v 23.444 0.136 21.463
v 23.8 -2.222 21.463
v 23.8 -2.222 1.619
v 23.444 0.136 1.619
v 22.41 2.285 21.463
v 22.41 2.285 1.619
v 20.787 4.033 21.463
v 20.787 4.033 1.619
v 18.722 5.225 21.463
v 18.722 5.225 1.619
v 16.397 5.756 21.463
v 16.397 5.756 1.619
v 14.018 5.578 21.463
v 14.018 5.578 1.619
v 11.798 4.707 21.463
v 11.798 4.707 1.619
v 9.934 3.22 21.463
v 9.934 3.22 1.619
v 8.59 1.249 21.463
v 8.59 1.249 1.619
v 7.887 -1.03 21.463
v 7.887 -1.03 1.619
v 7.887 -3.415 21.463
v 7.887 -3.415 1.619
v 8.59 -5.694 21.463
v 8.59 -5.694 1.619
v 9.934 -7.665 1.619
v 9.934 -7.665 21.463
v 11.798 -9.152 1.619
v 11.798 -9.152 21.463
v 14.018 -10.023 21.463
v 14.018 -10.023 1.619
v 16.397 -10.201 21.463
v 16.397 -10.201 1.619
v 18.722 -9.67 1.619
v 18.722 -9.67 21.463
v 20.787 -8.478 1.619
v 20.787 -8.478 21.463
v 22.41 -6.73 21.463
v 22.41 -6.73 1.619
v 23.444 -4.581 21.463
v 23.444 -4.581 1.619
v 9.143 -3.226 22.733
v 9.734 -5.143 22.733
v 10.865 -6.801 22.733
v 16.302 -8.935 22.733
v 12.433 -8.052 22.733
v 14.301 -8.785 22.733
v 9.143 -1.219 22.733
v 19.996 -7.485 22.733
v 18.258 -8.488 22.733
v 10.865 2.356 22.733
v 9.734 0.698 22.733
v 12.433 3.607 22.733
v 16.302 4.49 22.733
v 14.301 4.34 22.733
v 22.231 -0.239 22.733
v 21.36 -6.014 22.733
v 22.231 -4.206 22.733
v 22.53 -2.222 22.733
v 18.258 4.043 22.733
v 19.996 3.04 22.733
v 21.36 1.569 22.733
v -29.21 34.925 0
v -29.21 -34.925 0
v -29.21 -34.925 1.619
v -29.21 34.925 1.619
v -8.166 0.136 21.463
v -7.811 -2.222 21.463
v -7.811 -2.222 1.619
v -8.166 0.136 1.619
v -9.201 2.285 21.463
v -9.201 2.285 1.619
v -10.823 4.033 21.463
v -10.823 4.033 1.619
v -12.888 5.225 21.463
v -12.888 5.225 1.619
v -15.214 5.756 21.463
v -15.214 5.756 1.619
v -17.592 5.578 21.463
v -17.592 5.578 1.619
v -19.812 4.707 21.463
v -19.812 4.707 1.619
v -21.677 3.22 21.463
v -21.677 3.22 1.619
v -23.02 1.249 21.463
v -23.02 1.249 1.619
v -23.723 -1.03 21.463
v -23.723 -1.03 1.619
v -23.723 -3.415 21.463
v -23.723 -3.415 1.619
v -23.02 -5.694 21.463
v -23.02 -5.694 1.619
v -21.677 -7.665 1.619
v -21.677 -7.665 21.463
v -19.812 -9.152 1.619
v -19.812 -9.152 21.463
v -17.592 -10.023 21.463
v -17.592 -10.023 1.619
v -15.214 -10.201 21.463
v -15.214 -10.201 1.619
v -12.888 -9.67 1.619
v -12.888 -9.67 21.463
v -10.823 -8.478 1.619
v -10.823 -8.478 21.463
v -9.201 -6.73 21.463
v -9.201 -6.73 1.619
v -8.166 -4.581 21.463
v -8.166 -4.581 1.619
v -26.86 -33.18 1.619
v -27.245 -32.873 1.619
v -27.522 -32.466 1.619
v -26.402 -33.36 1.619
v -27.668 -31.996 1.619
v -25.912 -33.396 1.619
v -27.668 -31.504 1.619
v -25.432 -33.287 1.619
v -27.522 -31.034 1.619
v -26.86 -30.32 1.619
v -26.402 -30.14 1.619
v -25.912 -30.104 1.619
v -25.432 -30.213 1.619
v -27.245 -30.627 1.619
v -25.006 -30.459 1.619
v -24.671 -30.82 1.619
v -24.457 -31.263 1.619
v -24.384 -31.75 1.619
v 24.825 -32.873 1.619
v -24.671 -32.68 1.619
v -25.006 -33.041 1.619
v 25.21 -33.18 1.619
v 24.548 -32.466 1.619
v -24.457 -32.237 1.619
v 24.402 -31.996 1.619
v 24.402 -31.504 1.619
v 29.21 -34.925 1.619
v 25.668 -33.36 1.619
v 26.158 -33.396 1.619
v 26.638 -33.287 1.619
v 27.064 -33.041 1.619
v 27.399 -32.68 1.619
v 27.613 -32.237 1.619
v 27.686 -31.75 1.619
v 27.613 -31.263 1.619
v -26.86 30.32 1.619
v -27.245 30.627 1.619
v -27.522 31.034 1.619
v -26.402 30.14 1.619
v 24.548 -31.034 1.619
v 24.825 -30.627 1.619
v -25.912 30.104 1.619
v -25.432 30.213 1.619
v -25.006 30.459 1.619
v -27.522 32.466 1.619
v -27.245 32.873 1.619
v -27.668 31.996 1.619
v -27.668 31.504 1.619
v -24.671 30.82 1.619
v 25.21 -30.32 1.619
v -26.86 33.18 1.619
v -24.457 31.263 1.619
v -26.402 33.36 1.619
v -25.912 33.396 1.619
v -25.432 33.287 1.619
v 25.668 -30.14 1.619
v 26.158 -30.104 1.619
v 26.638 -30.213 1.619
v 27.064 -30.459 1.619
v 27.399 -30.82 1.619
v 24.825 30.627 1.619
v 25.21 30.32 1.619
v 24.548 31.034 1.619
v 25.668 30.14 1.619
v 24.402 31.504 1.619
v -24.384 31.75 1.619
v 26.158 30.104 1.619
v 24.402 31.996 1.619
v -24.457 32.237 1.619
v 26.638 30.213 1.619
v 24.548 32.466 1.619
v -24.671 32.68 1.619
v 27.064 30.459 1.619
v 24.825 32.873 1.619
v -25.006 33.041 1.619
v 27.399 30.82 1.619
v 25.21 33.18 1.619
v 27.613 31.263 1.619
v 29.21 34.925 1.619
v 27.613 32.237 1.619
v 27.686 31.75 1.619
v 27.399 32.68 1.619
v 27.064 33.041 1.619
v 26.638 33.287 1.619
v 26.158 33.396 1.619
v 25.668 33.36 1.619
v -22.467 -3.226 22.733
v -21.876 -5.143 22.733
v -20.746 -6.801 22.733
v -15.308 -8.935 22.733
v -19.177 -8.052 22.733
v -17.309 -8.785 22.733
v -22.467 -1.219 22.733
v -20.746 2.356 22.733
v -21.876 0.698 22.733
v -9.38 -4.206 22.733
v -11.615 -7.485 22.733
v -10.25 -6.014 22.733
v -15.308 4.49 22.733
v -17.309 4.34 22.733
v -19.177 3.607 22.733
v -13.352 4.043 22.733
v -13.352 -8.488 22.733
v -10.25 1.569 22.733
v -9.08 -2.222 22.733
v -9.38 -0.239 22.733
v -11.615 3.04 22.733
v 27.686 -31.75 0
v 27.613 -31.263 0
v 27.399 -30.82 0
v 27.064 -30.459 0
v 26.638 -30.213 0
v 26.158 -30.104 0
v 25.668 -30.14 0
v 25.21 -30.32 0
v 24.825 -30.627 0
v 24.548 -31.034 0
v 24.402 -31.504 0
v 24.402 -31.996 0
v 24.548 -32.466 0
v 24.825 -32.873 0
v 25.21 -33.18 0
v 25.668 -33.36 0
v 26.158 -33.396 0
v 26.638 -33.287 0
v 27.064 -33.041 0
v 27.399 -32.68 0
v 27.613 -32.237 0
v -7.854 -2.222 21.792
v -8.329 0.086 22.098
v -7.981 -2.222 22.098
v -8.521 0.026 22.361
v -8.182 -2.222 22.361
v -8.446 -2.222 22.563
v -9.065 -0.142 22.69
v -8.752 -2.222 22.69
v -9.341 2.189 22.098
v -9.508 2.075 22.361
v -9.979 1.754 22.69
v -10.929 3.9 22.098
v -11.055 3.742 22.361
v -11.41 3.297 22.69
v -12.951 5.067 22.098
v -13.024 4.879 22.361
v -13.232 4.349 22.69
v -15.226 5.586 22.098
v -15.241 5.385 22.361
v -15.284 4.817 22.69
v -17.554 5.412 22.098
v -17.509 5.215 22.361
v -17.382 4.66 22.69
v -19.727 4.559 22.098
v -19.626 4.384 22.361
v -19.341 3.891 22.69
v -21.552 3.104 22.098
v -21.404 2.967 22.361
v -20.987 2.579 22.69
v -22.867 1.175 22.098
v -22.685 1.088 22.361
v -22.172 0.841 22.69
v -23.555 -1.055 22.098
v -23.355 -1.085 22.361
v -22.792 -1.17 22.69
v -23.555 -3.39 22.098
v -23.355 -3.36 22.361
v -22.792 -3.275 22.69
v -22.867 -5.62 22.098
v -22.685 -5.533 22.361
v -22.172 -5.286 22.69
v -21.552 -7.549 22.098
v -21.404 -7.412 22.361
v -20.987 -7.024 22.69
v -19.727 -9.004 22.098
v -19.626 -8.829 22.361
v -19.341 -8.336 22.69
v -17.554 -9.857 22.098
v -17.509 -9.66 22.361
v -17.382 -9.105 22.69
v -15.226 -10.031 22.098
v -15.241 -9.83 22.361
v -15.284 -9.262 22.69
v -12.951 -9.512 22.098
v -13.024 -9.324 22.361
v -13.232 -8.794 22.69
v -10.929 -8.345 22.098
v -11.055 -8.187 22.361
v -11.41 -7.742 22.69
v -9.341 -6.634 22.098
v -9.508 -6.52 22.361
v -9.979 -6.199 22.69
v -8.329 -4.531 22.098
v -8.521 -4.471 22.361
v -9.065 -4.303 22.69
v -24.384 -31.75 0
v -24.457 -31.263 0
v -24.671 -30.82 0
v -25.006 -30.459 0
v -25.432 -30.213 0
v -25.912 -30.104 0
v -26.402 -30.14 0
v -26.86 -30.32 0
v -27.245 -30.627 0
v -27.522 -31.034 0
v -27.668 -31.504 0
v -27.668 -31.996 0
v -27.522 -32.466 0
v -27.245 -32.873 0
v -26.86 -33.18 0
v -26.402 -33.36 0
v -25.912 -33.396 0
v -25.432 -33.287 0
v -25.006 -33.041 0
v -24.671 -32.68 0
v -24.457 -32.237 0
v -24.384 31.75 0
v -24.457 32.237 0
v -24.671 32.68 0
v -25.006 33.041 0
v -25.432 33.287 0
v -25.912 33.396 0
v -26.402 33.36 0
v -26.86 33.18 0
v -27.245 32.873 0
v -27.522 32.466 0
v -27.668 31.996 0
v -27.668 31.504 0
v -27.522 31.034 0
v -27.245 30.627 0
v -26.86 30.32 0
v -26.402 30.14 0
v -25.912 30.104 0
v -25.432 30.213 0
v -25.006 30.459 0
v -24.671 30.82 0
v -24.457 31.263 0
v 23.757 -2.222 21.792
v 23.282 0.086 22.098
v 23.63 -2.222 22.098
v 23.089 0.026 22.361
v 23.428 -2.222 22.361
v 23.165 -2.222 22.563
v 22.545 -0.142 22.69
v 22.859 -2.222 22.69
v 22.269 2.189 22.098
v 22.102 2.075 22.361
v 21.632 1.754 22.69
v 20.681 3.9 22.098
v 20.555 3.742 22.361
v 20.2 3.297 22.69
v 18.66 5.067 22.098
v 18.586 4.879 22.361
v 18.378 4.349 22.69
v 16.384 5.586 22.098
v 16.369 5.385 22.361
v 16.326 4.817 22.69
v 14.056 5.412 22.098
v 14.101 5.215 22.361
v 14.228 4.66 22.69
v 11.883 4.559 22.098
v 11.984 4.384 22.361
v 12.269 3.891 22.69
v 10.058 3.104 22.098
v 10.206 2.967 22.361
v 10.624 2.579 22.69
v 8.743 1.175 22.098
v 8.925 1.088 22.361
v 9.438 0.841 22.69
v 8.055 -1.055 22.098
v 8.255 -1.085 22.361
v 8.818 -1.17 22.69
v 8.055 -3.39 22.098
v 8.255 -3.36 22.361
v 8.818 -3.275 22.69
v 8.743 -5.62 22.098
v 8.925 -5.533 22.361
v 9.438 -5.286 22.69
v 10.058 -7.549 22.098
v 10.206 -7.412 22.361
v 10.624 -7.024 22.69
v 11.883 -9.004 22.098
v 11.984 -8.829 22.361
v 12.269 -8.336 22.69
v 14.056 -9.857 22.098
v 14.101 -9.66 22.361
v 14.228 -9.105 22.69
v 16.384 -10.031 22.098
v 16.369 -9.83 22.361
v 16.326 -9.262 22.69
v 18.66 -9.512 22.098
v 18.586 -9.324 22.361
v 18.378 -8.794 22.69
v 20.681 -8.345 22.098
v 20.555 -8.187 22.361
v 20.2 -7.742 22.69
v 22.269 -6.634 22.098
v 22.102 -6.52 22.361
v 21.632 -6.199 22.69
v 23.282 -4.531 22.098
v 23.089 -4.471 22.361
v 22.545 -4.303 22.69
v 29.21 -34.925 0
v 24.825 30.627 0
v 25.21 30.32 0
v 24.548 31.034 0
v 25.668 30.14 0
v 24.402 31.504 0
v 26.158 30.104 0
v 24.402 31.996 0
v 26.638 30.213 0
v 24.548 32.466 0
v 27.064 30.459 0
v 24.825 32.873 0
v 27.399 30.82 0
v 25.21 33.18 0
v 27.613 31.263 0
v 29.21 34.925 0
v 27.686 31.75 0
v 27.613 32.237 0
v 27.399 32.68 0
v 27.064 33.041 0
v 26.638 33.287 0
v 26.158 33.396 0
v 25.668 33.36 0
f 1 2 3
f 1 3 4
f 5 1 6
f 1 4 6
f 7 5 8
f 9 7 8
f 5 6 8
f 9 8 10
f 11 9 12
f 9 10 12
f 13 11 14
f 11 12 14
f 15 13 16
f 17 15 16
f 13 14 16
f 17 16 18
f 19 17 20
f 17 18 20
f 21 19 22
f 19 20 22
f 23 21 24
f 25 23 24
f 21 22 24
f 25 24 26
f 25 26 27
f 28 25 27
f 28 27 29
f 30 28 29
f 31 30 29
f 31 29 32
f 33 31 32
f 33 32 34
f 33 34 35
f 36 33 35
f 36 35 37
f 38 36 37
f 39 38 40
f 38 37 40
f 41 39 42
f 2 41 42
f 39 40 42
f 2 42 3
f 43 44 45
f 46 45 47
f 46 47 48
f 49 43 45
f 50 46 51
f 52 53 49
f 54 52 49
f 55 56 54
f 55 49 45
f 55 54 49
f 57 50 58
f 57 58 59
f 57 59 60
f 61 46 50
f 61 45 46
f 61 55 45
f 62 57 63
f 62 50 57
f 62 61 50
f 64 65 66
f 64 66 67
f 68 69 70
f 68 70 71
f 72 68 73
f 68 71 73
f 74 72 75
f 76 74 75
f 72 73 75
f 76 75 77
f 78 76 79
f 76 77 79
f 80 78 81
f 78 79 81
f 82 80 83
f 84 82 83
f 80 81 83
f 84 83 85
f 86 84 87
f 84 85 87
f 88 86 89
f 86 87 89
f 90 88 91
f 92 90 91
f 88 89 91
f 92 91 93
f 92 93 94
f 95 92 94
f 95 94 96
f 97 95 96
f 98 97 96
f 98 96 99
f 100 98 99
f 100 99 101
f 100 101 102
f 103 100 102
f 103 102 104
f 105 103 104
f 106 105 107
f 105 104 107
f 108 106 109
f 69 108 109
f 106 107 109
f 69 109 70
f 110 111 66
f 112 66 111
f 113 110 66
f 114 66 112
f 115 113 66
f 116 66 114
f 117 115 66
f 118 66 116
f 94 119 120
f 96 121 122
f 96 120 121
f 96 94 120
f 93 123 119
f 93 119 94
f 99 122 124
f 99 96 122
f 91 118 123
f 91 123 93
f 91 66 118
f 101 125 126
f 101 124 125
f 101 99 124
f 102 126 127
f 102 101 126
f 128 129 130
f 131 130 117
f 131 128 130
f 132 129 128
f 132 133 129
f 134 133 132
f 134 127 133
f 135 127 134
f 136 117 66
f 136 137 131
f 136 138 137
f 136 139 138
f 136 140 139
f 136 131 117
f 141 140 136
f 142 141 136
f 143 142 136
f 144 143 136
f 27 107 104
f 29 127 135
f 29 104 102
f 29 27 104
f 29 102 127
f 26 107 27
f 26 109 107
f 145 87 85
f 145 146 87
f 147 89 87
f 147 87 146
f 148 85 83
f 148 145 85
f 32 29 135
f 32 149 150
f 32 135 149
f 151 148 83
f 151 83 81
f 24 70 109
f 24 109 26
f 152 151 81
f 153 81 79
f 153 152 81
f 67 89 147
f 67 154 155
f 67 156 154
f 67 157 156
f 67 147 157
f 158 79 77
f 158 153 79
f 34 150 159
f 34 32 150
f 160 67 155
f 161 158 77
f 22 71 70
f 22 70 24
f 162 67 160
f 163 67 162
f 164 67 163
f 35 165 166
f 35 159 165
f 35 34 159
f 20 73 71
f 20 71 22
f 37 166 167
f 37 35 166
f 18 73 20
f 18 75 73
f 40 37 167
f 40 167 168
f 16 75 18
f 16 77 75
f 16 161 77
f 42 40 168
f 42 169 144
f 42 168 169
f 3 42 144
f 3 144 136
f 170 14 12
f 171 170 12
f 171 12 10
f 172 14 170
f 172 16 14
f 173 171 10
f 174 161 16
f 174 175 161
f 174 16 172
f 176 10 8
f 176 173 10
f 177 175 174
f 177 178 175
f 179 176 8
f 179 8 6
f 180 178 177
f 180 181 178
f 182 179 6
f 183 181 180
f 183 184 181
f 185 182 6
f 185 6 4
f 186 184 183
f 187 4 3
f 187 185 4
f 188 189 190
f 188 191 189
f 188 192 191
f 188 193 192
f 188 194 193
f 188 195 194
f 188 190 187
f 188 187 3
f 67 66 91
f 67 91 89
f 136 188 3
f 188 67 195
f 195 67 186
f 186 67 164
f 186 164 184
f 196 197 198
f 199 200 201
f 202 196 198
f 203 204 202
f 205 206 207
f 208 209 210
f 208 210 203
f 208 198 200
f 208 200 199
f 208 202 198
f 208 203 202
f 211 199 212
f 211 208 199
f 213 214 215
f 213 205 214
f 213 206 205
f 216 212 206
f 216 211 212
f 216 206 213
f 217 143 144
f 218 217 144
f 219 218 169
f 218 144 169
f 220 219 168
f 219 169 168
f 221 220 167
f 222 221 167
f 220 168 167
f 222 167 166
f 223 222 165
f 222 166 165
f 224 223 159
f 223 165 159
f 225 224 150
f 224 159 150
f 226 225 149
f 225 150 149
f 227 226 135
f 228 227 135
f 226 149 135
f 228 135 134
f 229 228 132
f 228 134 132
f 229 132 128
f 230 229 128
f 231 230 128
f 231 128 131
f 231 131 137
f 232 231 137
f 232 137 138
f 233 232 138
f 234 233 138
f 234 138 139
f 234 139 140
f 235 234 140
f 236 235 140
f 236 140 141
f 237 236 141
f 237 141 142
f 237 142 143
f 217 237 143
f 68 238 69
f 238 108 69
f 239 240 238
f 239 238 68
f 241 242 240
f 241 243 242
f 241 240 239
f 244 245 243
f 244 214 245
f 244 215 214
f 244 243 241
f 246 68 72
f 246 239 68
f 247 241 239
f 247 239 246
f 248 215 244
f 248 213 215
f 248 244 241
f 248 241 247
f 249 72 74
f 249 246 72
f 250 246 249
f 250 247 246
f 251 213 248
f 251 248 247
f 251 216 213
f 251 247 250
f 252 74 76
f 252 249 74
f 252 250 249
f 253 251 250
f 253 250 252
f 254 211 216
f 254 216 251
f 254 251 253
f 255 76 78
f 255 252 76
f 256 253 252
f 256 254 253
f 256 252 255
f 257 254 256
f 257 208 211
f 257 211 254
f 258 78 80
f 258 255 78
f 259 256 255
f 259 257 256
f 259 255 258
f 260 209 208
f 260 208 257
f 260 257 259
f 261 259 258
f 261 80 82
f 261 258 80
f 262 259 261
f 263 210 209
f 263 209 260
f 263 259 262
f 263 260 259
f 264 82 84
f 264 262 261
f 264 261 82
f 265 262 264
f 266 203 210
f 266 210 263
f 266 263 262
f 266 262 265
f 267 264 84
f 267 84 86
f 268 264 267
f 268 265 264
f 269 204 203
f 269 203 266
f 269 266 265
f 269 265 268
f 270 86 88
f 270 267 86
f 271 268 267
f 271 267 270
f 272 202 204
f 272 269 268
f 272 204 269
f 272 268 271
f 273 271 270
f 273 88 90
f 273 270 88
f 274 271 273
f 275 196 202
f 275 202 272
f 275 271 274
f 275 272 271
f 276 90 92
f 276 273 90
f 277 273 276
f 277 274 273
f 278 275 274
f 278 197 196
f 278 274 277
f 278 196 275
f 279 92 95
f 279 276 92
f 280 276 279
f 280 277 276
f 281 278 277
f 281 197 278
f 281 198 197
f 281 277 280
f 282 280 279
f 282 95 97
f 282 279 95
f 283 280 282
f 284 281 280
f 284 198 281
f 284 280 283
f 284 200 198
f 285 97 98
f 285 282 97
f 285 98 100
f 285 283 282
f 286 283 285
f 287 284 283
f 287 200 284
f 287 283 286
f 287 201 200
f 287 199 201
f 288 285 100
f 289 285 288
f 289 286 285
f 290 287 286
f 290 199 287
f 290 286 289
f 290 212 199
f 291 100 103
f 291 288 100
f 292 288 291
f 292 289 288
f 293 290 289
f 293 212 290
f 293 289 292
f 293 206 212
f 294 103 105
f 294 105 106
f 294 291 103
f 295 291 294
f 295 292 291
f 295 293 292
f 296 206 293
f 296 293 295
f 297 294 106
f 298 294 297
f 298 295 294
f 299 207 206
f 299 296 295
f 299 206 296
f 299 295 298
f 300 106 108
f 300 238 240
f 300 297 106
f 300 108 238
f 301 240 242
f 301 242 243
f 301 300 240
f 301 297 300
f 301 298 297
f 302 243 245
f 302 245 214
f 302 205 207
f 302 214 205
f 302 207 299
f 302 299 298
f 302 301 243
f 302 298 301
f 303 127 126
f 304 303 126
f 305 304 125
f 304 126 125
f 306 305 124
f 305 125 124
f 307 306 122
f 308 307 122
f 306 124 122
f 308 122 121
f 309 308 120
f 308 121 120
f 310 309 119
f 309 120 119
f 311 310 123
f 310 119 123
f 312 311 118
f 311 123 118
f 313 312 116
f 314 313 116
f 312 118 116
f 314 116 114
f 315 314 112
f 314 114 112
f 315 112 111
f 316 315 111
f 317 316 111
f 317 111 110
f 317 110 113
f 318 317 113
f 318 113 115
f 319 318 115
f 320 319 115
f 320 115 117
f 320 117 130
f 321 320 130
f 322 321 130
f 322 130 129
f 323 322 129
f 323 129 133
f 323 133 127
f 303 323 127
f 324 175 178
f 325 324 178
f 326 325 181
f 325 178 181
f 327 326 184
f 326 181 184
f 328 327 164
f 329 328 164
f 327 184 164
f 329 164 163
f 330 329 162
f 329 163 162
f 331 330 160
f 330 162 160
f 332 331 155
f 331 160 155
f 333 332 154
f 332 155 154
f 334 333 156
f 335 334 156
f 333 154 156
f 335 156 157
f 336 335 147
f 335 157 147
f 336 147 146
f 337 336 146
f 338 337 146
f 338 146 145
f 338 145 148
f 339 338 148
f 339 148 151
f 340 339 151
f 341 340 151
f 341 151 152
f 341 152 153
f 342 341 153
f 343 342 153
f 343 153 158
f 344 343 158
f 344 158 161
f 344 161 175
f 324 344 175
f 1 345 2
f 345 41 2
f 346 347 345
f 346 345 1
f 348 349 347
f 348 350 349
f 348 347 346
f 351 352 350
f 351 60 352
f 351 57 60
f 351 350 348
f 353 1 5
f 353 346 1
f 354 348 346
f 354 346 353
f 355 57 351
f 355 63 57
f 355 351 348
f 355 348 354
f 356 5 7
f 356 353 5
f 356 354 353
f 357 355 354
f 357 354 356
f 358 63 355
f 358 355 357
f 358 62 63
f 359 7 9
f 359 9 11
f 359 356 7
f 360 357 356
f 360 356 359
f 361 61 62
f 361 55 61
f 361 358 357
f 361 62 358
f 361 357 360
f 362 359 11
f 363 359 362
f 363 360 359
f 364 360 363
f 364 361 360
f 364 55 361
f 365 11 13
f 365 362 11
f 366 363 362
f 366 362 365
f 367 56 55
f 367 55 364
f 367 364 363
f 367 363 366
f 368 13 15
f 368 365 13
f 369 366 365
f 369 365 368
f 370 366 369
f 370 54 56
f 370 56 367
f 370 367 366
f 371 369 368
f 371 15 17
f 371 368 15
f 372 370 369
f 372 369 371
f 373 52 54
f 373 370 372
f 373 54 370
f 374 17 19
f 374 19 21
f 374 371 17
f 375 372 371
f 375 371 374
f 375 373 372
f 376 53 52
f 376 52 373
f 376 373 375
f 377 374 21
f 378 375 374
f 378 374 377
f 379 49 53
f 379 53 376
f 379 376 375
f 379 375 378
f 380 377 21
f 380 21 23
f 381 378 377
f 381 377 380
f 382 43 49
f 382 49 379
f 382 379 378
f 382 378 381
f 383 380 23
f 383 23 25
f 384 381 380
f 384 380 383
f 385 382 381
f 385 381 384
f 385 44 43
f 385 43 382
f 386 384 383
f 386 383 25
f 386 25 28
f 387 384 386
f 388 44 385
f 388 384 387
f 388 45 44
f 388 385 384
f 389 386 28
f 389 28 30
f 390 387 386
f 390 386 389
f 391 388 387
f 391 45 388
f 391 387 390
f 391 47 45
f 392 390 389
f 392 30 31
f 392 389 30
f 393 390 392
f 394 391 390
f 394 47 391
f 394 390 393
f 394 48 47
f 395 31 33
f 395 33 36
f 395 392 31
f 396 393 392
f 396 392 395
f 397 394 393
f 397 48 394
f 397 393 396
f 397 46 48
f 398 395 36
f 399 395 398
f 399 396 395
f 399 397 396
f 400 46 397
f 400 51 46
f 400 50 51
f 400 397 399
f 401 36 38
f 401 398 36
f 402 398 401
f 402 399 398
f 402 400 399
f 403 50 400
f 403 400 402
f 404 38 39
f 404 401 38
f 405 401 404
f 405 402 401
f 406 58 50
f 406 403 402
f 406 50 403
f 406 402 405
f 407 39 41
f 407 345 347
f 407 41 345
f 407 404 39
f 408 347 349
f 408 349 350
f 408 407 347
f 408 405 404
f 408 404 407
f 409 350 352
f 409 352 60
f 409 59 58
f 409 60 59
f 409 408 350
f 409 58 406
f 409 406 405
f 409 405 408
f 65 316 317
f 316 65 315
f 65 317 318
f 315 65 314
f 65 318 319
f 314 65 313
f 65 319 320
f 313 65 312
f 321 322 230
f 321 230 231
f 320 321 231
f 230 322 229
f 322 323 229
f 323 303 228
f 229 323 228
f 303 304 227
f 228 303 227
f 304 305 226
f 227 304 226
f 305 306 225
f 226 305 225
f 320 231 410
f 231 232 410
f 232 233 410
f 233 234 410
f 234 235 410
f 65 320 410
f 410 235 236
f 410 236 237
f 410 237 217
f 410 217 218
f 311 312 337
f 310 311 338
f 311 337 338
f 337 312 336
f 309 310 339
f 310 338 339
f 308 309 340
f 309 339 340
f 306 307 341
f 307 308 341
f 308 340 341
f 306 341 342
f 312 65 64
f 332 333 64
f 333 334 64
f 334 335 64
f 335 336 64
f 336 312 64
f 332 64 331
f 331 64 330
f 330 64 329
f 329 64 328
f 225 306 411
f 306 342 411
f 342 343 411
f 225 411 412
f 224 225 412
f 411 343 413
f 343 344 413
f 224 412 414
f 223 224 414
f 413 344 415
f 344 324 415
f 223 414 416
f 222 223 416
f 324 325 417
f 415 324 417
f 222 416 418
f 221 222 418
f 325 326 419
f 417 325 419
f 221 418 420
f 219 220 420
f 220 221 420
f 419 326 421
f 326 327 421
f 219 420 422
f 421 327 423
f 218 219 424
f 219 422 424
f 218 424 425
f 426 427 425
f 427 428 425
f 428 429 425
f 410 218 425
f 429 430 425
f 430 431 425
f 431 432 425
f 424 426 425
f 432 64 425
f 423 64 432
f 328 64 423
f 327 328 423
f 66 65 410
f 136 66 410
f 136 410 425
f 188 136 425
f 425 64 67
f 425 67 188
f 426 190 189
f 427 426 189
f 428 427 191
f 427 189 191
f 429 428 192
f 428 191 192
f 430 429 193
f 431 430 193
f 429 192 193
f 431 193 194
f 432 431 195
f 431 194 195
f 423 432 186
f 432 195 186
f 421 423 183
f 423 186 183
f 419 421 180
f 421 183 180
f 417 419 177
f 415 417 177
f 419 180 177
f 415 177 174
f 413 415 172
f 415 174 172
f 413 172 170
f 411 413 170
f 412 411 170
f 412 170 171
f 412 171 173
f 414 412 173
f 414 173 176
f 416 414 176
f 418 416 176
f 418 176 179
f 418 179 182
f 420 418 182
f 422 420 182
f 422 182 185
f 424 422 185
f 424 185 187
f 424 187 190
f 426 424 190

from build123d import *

# Parameters (mm, degrees)
F0_W     = 58.42
F0_H     = 69.85
F1_DEPTH = 1.61925
F2_R     = 1.651
F3_DEPTH = 25.4
F4_R     = 8.001
F5_DEPTH = 21.11375
F6_R     = 1.27


with BuildPart() as f1:
    # F0 (on Top) → F1 (new body)
    with BuildSketch(Plane.XY):
        Rectangle(F0_W, F0_H)
    extrude(amount=F1_DEPTH)

    # F2 (on face) → F3 (cut)
    with BuildSketch(Plane.XY.offset(1.61925)):
        with Locations((-26.035, -31.75)):
            Circle(F2_R)
        with Locations((26.035, -31.75)):
            Circle(F2_R)
        with Locations((-26.035, 31.75)):
            Circle(F2_R)
        with Locations((26.035, 31.75)):
            Circle(F2_R)
    extrude(amount=-F3_DEPTH, mode=Mode.SUBTRACT)

    # F4 (on face) → F5 (join)
    with BuildSketch(Plane.XY.offset(1.61925)):
        with Locations((-15.8115, -2.2225)):
            Circle(F4_R)
        with Locations((15.7988, -2.2225)):
            Circle(F4_R)
    extrude(amount=F5_DEPTH)

    # F6
    f6_edges = [f1.edges().sort_by_distance(p)[0] for p in [
        (-23.8125, -2.2225, 22.733),
        (7.7978, -2.2225, 22.733),
    ]]
    fillet(f6_edges, radius=F6_R)


solid = f1.part
